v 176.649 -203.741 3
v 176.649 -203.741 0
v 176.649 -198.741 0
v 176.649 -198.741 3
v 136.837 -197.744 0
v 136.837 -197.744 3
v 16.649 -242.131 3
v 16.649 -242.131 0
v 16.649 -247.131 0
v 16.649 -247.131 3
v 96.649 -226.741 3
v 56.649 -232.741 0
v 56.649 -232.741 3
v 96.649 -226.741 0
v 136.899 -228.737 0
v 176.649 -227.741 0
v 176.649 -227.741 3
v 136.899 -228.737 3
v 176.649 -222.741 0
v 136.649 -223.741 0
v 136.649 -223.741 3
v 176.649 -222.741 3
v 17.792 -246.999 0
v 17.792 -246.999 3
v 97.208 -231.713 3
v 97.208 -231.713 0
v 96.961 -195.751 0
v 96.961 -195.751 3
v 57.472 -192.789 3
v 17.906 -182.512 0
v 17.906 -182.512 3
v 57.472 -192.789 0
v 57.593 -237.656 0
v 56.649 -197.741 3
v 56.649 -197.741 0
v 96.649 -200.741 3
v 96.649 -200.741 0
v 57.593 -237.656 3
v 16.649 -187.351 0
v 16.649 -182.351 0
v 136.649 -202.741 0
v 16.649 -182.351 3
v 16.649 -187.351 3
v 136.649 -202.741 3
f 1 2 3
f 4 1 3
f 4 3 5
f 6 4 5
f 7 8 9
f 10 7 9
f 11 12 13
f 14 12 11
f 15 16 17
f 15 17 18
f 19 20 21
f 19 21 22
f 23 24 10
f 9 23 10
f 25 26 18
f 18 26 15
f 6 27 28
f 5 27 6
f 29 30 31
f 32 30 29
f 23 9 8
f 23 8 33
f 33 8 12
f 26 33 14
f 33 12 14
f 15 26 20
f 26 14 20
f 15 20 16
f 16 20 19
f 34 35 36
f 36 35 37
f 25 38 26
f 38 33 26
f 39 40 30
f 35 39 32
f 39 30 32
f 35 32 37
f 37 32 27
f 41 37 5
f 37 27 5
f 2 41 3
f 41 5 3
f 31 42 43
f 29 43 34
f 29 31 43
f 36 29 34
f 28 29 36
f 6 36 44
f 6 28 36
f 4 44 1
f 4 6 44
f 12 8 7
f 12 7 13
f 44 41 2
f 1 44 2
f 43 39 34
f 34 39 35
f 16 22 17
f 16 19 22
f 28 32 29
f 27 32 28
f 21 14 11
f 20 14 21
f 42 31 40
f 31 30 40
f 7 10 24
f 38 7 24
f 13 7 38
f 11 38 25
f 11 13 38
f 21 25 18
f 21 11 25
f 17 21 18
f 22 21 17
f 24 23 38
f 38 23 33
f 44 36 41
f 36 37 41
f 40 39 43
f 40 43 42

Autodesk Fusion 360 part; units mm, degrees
sketch "Sketch1" plane through (0, 0, 0) normal (0, 0, 1) x (1, 0, 0)
  line L0 (16.6494, -187.3513) -> (56.6494, -197.7413)
  line L1 (56.6494, -197.7413) -> (96.6494, -200.7413)
  line L2 (96.6494, -200.7413) -> (136.6494, -202.7413)
  line L3 (136.6494, -202.7413) -> (176.6494, -203.7413)
  line L4 (16.6494, -242.1313) -> (56.6494, -232.7413)
  line L5 (56.6494, -232.7413) -> (96.6494, -226.7413)
  line L6 (96.6494, -226.7413) -> (136.6494, -223.7413)
  line L7 (136.6494, -223.7413) -> (176.6494, -222.7413)
  line L8 (17.9064, -182.5119) -> (57.4715, -192.7889)
  line L9 (57.4715, -192.7889) -> (96.9613, -195.7506)
  line L10 (96.9613, -195.7506) -> (136.8367, -197.7444)
  line L11 (17.7921, -246.999) -> (57.5932, -237.6557)
  line L12 (57.5932, -237.6557) -> (97.208, -231.7134)
  line L13 (97.208, -231.7134) -> (136.899, -228.7366)
  line L14 (16.6494, -187.3513) -> (16.6494, -182.3513)
  line L15 (16.6494, -242.1313) -> (16.6494, -247.1313)
  line L16 (176.6494, -203.7413) -> (176.6494, -198.7413)
  line L17 (176.6494, -222.7413) -> (176.6494, -227.7413)
  line L18 (17.9064, -182.5119) -> (16.6494, -182.3513)
  line L19 (17.7921, -246.999) -> (16.6494, -247.1313)
  line L20 (176.6494, -227.7413) -> (136.899, -228.7366)
  line L21 (176.6494, -198.7413) -> (136.8367, -197.7444)
  dimension "d5" = 54.78
  dimension "d17" = 5
  dimension "d18" = 5
  dimension "d19" = 5
  dimension "d20" = 5
extrude "Extrude1" add sketch "Sketch1" along normal blind 3 makes body 1 at (43.6306, -237.5094, 0) makes body 2 at (43.5901, -192.6272, 0)
